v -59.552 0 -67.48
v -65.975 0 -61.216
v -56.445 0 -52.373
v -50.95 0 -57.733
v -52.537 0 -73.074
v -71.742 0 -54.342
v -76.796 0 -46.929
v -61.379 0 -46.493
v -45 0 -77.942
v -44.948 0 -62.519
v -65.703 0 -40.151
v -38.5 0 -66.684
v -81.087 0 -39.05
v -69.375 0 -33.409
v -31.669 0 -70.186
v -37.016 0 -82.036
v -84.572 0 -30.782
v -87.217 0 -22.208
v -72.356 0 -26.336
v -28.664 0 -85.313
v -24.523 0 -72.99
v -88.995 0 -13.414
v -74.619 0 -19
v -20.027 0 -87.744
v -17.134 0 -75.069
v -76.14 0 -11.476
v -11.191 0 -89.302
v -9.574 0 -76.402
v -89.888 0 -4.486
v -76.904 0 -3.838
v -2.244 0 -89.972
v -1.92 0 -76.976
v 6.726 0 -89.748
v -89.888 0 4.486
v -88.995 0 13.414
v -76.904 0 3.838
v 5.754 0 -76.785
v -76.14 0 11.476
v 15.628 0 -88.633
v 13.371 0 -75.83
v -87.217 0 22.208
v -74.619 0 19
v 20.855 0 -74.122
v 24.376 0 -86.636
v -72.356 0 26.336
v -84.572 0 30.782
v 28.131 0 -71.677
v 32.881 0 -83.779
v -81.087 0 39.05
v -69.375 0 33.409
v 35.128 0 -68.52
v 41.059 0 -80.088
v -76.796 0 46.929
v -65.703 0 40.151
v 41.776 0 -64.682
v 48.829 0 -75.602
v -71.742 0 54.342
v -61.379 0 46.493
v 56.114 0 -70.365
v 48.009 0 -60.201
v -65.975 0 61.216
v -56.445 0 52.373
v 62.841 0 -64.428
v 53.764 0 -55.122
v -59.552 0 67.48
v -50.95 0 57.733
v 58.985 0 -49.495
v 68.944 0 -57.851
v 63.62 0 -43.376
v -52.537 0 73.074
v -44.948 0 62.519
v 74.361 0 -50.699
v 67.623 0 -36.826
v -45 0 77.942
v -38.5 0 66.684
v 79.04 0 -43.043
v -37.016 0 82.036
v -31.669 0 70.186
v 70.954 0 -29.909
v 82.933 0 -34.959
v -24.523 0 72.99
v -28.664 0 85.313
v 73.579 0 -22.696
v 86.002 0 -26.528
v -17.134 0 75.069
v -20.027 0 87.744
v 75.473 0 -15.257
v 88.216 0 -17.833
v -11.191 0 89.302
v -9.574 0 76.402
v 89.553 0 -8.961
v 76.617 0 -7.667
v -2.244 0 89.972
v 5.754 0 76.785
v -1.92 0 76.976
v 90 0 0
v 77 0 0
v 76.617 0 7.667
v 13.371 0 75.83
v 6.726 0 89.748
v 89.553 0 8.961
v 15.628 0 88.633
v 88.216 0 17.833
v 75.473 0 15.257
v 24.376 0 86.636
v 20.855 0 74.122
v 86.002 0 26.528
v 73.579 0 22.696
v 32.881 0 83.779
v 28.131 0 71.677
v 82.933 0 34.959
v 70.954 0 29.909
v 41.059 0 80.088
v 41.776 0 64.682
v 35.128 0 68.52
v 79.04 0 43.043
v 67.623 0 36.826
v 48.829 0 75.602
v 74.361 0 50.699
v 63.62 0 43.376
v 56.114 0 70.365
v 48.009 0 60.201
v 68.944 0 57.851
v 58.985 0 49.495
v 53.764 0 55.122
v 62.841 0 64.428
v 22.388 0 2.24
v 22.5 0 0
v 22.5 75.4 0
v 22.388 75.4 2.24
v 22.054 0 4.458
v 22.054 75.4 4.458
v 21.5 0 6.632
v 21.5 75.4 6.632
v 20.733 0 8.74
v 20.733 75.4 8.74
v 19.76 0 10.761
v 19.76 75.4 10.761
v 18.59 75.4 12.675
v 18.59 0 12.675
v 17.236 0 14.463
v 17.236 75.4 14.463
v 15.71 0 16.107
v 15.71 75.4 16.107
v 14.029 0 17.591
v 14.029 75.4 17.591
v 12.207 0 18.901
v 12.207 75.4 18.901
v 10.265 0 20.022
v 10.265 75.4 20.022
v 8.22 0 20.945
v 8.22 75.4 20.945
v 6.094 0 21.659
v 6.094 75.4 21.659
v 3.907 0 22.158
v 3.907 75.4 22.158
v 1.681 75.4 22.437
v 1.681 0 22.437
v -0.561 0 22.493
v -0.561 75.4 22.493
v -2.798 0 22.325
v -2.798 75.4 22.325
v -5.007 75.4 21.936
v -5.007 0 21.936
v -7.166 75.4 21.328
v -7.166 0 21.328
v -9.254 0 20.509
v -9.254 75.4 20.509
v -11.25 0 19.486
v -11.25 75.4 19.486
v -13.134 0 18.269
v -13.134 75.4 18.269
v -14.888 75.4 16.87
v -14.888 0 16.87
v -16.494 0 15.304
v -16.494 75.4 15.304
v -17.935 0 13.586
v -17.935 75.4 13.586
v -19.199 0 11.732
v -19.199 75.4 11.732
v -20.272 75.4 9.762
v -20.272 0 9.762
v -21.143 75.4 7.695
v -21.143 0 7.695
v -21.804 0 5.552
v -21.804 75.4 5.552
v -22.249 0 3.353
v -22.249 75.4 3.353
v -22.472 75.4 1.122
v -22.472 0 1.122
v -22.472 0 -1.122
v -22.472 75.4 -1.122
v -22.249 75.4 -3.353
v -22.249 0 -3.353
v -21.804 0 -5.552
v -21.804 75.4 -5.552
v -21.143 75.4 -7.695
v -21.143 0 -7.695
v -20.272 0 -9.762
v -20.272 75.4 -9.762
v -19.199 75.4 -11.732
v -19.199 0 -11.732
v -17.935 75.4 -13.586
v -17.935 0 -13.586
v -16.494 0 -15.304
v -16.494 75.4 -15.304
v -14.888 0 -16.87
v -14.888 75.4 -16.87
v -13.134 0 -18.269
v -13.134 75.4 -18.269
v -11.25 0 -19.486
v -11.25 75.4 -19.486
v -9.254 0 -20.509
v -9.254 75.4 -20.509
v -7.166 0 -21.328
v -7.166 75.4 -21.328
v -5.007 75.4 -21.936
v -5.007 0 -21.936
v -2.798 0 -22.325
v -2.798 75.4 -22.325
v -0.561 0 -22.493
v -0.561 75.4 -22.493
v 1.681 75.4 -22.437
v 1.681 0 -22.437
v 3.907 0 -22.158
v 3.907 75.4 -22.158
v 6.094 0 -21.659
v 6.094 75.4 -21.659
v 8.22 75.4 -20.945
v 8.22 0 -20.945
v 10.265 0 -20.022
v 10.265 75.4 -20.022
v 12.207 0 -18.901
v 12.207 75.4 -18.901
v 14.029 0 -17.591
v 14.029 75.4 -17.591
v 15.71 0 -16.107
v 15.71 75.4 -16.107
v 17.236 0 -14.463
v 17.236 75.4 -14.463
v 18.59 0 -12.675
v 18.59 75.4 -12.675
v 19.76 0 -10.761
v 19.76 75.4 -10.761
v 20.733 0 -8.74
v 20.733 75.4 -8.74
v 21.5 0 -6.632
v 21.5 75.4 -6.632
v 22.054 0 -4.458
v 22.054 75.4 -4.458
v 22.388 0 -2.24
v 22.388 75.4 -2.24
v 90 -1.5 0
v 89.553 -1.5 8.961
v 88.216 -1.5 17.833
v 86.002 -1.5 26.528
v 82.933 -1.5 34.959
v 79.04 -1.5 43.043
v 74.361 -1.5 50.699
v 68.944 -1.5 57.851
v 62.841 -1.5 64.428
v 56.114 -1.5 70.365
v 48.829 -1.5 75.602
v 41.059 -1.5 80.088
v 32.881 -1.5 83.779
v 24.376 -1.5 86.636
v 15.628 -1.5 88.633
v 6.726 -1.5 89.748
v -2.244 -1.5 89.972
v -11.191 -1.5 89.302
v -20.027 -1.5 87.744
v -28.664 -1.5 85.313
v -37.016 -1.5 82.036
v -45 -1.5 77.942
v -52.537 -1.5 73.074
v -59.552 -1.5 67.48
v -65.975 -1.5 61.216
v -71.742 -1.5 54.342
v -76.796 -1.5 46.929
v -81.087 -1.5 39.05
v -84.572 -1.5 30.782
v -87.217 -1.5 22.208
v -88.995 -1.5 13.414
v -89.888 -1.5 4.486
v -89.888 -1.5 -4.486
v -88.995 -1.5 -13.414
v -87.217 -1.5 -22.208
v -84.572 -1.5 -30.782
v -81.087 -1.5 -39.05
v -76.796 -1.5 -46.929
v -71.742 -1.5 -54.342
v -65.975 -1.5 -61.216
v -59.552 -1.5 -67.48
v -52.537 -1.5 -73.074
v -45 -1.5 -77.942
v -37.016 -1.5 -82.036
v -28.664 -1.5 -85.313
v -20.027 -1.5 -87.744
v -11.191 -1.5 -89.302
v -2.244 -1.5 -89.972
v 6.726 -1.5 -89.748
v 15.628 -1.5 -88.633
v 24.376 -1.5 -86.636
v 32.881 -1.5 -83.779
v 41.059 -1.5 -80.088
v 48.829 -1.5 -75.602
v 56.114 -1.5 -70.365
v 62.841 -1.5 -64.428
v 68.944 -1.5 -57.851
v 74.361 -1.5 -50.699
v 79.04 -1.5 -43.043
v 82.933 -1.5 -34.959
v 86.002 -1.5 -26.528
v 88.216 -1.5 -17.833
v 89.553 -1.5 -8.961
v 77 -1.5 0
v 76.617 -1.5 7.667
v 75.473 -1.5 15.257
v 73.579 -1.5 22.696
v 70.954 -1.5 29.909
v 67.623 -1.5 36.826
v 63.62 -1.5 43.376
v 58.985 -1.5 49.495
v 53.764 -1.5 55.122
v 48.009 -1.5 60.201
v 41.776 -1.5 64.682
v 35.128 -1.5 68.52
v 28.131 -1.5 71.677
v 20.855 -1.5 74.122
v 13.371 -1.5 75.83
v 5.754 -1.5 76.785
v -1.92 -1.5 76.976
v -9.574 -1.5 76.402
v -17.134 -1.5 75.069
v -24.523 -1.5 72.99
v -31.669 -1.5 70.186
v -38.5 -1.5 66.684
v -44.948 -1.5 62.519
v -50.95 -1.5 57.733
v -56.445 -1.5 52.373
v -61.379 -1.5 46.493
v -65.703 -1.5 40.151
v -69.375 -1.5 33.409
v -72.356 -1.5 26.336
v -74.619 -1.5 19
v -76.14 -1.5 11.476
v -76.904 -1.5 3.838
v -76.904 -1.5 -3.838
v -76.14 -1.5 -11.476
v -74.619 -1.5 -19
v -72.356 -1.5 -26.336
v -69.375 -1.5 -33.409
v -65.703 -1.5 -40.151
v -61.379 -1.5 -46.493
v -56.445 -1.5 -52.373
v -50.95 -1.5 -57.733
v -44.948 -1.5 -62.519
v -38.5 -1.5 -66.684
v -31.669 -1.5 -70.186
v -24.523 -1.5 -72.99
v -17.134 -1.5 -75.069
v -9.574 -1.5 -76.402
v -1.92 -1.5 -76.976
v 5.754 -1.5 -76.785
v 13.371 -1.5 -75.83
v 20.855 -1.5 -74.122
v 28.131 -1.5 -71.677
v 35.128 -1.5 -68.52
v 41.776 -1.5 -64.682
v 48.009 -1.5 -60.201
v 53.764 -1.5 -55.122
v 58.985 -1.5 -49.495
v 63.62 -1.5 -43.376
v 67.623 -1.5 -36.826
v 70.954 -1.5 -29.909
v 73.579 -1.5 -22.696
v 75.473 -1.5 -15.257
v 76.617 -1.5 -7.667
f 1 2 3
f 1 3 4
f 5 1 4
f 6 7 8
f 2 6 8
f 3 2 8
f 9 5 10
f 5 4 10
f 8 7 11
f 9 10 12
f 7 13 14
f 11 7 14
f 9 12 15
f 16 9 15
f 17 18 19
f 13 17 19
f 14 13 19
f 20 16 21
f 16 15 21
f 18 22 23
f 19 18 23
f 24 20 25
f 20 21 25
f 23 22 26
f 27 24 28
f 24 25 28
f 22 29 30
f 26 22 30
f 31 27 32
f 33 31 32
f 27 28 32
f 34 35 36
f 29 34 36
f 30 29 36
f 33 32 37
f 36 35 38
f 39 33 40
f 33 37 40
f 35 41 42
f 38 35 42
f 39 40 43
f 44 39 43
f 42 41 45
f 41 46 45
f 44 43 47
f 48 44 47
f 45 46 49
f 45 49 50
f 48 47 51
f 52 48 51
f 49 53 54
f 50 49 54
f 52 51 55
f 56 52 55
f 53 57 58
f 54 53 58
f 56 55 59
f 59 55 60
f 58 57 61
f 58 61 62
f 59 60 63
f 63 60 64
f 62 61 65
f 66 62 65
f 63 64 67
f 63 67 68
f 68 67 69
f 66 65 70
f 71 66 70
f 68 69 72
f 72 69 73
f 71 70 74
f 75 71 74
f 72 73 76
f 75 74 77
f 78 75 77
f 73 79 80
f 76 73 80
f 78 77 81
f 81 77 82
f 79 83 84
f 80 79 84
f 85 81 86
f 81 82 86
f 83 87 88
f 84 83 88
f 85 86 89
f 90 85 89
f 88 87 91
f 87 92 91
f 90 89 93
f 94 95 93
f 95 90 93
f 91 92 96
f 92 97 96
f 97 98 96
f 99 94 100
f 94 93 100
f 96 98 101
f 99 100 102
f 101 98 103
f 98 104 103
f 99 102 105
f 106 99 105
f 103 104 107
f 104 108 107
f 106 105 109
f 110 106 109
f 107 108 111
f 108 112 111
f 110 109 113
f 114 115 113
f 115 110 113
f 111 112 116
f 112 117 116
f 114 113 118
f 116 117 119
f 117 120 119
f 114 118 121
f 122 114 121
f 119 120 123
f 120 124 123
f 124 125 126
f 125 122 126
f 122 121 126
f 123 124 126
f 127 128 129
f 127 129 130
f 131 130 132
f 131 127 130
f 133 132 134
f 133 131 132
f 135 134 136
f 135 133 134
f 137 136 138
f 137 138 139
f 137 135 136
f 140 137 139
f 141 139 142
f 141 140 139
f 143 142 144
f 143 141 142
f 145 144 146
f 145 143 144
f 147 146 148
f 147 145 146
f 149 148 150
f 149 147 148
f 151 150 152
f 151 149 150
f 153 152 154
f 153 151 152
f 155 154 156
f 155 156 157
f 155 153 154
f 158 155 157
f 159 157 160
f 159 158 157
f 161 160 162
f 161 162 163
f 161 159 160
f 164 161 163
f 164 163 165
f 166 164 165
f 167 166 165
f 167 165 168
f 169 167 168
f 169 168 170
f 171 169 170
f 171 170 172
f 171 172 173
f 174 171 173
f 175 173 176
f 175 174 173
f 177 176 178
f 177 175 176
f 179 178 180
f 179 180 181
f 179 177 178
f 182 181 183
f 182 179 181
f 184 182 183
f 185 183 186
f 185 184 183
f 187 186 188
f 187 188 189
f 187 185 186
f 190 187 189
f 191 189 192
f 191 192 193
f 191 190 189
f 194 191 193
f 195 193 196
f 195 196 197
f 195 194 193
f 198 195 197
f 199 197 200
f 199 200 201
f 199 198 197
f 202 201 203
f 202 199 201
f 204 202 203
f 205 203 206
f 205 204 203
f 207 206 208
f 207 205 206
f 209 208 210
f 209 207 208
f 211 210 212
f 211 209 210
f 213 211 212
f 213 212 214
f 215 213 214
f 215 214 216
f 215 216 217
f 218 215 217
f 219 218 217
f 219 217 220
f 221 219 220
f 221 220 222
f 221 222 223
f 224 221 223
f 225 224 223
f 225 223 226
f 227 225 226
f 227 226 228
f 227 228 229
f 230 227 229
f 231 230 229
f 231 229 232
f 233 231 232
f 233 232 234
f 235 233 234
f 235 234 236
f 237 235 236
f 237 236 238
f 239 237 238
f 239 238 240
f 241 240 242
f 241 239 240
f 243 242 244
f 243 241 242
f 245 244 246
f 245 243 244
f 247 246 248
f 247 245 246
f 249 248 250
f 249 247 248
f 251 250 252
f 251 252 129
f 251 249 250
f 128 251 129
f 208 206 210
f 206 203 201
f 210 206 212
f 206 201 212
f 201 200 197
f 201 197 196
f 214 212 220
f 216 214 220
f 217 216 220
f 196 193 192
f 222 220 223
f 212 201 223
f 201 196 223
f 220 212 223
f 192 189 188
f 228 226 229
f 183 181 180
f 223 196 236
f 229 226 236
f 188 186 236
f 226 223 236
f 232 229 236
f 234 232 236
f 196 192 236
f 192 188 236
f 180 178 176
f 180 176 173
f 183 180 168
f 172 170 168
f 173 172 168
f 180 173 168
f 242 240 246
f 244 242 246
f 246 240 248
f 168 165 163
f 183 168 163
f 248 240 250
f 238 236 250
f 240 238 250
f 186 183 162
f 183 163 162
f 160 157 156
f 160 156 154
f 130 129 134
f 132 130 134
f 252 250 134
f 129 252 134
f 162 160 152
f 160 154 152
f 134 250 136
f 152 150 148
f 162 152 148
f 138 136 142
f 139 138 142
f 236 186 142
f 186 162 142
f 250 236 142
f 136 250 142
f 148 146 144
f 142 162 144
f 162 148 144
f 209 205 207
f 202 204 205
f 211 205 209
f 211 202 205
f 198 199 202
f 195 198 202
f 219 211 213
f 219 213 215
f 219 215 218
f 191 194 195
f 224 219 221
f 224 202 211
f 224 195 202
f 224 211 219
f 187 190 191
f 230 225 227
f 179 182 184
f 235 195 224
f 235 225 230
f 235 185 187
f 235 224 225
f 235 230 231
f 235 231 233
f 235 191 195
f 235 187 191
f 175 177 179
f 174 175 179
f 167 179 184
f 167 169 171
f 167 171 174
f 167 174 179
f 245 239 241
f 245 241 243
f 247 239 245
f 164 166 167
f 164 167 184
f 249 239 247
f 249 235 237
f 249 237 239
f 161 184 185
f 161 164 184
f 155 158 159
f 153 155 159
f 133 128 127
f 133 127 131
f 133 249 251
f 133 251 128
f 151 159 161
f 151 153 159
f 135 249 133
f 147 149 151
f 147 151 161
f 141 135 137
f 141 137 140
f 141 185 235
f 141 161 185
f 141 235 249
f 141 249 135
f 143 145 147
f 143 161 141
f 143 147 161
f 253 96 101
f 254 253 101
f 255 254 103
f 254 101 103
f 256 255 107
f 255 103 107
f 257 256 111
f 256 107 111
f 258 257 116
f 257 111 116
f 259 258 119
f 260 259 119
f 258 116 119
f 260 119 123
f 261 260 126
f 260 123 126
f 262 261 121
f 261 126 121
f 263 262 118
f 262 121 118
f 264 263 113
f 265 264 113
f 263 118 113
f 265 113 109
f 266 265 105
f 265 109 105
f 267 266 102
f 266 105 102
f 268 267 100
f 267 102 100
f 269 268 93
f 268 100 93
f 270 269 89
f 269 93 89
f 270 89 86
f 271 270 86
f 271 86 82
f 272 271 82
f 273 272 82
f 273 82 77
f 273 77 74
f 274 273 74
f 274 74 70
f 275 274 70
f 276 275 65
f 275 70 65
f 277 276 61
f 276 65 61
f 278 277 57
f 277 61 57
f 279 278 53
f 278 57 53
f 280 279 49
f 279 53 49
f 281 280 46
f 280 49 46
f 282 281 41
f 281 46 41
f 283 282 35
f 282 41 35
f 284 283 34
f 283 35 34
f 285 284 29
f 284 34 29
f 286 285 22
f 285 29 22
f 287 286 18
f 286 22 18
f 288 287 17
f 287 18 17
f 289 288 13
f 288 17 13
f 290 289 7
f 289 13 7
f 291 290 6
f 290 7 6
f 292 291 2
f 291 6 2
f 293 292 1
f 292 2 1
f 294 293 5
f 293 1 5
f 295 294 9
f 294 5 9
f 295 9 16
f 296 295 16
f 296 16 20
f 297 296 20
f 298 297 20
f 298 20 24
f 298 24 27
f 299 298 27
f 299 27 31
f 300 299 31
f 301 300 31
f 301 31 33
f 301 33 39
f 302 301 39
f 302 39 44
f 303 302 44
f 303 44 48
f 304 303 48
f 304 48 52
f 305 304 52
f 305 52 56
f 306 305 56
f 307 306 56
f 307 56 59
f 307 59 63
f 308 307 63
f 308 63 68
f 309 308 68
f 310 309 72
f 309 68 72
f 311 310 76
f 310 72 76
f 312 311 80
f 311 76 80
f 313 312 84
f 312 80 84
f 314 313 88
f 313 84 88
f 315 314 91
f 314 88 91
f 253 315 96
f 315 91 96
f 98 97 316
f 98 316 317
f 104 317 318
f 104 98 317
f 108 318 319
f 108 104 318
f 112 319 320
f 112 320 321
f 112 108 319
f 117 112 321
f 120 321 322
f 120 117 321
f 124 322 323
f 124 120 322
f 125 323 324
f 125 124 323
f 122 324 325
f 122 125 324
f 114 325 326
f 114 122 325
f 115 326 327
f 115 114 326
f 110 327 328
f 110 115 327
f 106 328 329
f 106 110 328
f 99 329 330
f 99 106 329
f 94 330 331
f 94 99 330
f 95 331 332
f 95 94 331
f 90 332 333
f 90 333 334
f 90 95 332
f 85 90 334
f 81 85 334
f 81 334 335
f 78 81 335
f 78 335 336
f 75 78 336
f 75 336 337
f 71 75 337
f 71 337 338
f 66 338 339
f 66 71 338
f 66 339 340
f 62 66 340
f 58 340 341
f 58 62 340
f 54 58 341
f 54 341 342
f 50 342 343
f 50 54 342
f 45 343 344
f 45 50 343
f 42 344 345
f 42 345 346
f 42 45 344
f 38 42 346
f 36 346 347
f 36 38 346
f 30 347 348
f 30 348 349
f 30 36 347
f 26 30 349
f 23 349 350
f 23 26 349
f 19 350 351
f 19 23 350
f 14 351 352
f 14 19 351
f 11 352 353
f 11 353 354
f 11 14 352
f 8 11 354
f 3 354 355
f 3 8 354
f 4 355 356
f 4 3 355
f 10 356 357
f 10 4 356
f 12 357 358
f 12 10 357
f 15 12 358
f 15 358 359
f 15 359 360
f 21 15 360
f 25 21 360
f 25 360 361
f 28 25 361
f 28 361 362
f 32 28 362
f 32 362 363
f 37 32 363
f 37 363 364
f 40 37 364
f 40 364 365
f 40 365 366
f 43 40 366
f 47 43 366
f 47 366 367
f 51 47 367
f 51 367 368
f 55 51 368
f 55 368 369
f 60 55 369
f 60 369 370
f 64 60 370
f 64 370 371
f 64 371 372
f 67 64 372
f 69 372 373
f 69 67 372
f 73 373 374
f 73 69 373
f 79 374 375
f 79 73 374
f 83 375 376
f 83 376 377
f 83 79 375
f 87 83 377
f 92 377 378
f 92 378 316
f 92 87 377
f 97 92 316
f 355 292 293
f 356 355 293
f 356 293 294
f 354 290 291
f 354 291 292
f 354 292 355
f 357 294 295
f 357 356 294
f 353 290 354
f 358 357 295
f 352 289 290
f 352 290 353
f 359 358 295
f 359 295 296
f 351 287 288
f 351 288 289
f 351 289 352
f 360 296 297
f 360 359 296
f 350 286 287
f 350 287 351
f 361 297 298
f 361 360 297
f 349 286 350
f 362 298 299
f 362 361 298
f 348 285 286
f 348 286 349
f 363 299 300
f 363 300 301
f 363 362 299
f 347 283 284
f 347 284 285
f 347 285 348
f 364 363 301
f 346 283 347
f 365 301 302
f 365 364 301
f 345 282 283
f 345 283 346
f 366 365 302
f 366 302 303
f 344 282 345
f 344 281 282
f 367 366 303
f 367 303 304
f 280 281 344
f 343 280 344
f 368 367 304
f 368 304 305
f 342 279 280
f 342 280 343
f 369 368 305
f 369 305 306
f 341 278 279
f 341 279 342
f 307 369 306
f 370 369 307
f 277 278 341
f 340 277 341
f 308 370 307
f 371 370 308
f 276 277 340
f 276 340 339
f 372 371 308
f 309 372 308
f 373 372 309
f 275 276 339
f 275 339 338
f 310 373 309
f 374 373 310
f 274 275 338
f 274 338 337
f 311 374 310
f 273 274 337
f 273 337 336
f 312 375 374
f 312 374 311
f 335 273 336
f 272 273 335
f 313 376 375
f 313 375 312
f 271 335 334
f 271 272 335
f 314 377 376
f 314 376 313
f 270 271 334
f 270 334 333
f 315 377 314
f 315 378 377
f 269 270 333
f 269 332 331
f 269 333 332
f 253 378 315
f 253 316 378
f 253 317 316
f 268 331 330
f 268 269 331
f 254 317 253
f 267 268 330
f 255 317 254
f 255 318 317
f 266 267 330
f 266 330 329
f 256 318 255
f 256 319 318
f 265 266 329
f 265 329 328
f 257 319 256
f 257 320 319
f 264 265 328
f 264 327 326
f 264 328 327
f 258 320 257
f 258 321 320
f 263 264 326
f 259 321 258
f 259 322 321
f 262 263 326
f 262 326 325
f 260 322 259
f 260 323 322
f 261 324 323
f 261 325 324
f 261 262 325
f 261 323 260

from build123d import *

# Parameters (mm, degrees)
F0_R     = 90
F0_R_2   = 77
F1_DEPTH = 1.5
F2_R     = 22.5
F3_DEPTH = 75.4


with BuildPart() as f1:
    # F0 (on Front) → F1 (new body)
    with BuildSketch(Plane.XZ):
        Circle(F0_R)
        Circle(F0_R_2, mode=Mode.SUBTRACT)
    extrude(amount=F1_DEPTH)


with BuildPart() as f3:
    # F2 (on Front) → F3 (new body)
    with BuildSketch(Plane.XZ):
        Circle(F2_R)
    extrude(amount=-F3_DEPTH)


solid = Compound([f1.part, f3.part])
